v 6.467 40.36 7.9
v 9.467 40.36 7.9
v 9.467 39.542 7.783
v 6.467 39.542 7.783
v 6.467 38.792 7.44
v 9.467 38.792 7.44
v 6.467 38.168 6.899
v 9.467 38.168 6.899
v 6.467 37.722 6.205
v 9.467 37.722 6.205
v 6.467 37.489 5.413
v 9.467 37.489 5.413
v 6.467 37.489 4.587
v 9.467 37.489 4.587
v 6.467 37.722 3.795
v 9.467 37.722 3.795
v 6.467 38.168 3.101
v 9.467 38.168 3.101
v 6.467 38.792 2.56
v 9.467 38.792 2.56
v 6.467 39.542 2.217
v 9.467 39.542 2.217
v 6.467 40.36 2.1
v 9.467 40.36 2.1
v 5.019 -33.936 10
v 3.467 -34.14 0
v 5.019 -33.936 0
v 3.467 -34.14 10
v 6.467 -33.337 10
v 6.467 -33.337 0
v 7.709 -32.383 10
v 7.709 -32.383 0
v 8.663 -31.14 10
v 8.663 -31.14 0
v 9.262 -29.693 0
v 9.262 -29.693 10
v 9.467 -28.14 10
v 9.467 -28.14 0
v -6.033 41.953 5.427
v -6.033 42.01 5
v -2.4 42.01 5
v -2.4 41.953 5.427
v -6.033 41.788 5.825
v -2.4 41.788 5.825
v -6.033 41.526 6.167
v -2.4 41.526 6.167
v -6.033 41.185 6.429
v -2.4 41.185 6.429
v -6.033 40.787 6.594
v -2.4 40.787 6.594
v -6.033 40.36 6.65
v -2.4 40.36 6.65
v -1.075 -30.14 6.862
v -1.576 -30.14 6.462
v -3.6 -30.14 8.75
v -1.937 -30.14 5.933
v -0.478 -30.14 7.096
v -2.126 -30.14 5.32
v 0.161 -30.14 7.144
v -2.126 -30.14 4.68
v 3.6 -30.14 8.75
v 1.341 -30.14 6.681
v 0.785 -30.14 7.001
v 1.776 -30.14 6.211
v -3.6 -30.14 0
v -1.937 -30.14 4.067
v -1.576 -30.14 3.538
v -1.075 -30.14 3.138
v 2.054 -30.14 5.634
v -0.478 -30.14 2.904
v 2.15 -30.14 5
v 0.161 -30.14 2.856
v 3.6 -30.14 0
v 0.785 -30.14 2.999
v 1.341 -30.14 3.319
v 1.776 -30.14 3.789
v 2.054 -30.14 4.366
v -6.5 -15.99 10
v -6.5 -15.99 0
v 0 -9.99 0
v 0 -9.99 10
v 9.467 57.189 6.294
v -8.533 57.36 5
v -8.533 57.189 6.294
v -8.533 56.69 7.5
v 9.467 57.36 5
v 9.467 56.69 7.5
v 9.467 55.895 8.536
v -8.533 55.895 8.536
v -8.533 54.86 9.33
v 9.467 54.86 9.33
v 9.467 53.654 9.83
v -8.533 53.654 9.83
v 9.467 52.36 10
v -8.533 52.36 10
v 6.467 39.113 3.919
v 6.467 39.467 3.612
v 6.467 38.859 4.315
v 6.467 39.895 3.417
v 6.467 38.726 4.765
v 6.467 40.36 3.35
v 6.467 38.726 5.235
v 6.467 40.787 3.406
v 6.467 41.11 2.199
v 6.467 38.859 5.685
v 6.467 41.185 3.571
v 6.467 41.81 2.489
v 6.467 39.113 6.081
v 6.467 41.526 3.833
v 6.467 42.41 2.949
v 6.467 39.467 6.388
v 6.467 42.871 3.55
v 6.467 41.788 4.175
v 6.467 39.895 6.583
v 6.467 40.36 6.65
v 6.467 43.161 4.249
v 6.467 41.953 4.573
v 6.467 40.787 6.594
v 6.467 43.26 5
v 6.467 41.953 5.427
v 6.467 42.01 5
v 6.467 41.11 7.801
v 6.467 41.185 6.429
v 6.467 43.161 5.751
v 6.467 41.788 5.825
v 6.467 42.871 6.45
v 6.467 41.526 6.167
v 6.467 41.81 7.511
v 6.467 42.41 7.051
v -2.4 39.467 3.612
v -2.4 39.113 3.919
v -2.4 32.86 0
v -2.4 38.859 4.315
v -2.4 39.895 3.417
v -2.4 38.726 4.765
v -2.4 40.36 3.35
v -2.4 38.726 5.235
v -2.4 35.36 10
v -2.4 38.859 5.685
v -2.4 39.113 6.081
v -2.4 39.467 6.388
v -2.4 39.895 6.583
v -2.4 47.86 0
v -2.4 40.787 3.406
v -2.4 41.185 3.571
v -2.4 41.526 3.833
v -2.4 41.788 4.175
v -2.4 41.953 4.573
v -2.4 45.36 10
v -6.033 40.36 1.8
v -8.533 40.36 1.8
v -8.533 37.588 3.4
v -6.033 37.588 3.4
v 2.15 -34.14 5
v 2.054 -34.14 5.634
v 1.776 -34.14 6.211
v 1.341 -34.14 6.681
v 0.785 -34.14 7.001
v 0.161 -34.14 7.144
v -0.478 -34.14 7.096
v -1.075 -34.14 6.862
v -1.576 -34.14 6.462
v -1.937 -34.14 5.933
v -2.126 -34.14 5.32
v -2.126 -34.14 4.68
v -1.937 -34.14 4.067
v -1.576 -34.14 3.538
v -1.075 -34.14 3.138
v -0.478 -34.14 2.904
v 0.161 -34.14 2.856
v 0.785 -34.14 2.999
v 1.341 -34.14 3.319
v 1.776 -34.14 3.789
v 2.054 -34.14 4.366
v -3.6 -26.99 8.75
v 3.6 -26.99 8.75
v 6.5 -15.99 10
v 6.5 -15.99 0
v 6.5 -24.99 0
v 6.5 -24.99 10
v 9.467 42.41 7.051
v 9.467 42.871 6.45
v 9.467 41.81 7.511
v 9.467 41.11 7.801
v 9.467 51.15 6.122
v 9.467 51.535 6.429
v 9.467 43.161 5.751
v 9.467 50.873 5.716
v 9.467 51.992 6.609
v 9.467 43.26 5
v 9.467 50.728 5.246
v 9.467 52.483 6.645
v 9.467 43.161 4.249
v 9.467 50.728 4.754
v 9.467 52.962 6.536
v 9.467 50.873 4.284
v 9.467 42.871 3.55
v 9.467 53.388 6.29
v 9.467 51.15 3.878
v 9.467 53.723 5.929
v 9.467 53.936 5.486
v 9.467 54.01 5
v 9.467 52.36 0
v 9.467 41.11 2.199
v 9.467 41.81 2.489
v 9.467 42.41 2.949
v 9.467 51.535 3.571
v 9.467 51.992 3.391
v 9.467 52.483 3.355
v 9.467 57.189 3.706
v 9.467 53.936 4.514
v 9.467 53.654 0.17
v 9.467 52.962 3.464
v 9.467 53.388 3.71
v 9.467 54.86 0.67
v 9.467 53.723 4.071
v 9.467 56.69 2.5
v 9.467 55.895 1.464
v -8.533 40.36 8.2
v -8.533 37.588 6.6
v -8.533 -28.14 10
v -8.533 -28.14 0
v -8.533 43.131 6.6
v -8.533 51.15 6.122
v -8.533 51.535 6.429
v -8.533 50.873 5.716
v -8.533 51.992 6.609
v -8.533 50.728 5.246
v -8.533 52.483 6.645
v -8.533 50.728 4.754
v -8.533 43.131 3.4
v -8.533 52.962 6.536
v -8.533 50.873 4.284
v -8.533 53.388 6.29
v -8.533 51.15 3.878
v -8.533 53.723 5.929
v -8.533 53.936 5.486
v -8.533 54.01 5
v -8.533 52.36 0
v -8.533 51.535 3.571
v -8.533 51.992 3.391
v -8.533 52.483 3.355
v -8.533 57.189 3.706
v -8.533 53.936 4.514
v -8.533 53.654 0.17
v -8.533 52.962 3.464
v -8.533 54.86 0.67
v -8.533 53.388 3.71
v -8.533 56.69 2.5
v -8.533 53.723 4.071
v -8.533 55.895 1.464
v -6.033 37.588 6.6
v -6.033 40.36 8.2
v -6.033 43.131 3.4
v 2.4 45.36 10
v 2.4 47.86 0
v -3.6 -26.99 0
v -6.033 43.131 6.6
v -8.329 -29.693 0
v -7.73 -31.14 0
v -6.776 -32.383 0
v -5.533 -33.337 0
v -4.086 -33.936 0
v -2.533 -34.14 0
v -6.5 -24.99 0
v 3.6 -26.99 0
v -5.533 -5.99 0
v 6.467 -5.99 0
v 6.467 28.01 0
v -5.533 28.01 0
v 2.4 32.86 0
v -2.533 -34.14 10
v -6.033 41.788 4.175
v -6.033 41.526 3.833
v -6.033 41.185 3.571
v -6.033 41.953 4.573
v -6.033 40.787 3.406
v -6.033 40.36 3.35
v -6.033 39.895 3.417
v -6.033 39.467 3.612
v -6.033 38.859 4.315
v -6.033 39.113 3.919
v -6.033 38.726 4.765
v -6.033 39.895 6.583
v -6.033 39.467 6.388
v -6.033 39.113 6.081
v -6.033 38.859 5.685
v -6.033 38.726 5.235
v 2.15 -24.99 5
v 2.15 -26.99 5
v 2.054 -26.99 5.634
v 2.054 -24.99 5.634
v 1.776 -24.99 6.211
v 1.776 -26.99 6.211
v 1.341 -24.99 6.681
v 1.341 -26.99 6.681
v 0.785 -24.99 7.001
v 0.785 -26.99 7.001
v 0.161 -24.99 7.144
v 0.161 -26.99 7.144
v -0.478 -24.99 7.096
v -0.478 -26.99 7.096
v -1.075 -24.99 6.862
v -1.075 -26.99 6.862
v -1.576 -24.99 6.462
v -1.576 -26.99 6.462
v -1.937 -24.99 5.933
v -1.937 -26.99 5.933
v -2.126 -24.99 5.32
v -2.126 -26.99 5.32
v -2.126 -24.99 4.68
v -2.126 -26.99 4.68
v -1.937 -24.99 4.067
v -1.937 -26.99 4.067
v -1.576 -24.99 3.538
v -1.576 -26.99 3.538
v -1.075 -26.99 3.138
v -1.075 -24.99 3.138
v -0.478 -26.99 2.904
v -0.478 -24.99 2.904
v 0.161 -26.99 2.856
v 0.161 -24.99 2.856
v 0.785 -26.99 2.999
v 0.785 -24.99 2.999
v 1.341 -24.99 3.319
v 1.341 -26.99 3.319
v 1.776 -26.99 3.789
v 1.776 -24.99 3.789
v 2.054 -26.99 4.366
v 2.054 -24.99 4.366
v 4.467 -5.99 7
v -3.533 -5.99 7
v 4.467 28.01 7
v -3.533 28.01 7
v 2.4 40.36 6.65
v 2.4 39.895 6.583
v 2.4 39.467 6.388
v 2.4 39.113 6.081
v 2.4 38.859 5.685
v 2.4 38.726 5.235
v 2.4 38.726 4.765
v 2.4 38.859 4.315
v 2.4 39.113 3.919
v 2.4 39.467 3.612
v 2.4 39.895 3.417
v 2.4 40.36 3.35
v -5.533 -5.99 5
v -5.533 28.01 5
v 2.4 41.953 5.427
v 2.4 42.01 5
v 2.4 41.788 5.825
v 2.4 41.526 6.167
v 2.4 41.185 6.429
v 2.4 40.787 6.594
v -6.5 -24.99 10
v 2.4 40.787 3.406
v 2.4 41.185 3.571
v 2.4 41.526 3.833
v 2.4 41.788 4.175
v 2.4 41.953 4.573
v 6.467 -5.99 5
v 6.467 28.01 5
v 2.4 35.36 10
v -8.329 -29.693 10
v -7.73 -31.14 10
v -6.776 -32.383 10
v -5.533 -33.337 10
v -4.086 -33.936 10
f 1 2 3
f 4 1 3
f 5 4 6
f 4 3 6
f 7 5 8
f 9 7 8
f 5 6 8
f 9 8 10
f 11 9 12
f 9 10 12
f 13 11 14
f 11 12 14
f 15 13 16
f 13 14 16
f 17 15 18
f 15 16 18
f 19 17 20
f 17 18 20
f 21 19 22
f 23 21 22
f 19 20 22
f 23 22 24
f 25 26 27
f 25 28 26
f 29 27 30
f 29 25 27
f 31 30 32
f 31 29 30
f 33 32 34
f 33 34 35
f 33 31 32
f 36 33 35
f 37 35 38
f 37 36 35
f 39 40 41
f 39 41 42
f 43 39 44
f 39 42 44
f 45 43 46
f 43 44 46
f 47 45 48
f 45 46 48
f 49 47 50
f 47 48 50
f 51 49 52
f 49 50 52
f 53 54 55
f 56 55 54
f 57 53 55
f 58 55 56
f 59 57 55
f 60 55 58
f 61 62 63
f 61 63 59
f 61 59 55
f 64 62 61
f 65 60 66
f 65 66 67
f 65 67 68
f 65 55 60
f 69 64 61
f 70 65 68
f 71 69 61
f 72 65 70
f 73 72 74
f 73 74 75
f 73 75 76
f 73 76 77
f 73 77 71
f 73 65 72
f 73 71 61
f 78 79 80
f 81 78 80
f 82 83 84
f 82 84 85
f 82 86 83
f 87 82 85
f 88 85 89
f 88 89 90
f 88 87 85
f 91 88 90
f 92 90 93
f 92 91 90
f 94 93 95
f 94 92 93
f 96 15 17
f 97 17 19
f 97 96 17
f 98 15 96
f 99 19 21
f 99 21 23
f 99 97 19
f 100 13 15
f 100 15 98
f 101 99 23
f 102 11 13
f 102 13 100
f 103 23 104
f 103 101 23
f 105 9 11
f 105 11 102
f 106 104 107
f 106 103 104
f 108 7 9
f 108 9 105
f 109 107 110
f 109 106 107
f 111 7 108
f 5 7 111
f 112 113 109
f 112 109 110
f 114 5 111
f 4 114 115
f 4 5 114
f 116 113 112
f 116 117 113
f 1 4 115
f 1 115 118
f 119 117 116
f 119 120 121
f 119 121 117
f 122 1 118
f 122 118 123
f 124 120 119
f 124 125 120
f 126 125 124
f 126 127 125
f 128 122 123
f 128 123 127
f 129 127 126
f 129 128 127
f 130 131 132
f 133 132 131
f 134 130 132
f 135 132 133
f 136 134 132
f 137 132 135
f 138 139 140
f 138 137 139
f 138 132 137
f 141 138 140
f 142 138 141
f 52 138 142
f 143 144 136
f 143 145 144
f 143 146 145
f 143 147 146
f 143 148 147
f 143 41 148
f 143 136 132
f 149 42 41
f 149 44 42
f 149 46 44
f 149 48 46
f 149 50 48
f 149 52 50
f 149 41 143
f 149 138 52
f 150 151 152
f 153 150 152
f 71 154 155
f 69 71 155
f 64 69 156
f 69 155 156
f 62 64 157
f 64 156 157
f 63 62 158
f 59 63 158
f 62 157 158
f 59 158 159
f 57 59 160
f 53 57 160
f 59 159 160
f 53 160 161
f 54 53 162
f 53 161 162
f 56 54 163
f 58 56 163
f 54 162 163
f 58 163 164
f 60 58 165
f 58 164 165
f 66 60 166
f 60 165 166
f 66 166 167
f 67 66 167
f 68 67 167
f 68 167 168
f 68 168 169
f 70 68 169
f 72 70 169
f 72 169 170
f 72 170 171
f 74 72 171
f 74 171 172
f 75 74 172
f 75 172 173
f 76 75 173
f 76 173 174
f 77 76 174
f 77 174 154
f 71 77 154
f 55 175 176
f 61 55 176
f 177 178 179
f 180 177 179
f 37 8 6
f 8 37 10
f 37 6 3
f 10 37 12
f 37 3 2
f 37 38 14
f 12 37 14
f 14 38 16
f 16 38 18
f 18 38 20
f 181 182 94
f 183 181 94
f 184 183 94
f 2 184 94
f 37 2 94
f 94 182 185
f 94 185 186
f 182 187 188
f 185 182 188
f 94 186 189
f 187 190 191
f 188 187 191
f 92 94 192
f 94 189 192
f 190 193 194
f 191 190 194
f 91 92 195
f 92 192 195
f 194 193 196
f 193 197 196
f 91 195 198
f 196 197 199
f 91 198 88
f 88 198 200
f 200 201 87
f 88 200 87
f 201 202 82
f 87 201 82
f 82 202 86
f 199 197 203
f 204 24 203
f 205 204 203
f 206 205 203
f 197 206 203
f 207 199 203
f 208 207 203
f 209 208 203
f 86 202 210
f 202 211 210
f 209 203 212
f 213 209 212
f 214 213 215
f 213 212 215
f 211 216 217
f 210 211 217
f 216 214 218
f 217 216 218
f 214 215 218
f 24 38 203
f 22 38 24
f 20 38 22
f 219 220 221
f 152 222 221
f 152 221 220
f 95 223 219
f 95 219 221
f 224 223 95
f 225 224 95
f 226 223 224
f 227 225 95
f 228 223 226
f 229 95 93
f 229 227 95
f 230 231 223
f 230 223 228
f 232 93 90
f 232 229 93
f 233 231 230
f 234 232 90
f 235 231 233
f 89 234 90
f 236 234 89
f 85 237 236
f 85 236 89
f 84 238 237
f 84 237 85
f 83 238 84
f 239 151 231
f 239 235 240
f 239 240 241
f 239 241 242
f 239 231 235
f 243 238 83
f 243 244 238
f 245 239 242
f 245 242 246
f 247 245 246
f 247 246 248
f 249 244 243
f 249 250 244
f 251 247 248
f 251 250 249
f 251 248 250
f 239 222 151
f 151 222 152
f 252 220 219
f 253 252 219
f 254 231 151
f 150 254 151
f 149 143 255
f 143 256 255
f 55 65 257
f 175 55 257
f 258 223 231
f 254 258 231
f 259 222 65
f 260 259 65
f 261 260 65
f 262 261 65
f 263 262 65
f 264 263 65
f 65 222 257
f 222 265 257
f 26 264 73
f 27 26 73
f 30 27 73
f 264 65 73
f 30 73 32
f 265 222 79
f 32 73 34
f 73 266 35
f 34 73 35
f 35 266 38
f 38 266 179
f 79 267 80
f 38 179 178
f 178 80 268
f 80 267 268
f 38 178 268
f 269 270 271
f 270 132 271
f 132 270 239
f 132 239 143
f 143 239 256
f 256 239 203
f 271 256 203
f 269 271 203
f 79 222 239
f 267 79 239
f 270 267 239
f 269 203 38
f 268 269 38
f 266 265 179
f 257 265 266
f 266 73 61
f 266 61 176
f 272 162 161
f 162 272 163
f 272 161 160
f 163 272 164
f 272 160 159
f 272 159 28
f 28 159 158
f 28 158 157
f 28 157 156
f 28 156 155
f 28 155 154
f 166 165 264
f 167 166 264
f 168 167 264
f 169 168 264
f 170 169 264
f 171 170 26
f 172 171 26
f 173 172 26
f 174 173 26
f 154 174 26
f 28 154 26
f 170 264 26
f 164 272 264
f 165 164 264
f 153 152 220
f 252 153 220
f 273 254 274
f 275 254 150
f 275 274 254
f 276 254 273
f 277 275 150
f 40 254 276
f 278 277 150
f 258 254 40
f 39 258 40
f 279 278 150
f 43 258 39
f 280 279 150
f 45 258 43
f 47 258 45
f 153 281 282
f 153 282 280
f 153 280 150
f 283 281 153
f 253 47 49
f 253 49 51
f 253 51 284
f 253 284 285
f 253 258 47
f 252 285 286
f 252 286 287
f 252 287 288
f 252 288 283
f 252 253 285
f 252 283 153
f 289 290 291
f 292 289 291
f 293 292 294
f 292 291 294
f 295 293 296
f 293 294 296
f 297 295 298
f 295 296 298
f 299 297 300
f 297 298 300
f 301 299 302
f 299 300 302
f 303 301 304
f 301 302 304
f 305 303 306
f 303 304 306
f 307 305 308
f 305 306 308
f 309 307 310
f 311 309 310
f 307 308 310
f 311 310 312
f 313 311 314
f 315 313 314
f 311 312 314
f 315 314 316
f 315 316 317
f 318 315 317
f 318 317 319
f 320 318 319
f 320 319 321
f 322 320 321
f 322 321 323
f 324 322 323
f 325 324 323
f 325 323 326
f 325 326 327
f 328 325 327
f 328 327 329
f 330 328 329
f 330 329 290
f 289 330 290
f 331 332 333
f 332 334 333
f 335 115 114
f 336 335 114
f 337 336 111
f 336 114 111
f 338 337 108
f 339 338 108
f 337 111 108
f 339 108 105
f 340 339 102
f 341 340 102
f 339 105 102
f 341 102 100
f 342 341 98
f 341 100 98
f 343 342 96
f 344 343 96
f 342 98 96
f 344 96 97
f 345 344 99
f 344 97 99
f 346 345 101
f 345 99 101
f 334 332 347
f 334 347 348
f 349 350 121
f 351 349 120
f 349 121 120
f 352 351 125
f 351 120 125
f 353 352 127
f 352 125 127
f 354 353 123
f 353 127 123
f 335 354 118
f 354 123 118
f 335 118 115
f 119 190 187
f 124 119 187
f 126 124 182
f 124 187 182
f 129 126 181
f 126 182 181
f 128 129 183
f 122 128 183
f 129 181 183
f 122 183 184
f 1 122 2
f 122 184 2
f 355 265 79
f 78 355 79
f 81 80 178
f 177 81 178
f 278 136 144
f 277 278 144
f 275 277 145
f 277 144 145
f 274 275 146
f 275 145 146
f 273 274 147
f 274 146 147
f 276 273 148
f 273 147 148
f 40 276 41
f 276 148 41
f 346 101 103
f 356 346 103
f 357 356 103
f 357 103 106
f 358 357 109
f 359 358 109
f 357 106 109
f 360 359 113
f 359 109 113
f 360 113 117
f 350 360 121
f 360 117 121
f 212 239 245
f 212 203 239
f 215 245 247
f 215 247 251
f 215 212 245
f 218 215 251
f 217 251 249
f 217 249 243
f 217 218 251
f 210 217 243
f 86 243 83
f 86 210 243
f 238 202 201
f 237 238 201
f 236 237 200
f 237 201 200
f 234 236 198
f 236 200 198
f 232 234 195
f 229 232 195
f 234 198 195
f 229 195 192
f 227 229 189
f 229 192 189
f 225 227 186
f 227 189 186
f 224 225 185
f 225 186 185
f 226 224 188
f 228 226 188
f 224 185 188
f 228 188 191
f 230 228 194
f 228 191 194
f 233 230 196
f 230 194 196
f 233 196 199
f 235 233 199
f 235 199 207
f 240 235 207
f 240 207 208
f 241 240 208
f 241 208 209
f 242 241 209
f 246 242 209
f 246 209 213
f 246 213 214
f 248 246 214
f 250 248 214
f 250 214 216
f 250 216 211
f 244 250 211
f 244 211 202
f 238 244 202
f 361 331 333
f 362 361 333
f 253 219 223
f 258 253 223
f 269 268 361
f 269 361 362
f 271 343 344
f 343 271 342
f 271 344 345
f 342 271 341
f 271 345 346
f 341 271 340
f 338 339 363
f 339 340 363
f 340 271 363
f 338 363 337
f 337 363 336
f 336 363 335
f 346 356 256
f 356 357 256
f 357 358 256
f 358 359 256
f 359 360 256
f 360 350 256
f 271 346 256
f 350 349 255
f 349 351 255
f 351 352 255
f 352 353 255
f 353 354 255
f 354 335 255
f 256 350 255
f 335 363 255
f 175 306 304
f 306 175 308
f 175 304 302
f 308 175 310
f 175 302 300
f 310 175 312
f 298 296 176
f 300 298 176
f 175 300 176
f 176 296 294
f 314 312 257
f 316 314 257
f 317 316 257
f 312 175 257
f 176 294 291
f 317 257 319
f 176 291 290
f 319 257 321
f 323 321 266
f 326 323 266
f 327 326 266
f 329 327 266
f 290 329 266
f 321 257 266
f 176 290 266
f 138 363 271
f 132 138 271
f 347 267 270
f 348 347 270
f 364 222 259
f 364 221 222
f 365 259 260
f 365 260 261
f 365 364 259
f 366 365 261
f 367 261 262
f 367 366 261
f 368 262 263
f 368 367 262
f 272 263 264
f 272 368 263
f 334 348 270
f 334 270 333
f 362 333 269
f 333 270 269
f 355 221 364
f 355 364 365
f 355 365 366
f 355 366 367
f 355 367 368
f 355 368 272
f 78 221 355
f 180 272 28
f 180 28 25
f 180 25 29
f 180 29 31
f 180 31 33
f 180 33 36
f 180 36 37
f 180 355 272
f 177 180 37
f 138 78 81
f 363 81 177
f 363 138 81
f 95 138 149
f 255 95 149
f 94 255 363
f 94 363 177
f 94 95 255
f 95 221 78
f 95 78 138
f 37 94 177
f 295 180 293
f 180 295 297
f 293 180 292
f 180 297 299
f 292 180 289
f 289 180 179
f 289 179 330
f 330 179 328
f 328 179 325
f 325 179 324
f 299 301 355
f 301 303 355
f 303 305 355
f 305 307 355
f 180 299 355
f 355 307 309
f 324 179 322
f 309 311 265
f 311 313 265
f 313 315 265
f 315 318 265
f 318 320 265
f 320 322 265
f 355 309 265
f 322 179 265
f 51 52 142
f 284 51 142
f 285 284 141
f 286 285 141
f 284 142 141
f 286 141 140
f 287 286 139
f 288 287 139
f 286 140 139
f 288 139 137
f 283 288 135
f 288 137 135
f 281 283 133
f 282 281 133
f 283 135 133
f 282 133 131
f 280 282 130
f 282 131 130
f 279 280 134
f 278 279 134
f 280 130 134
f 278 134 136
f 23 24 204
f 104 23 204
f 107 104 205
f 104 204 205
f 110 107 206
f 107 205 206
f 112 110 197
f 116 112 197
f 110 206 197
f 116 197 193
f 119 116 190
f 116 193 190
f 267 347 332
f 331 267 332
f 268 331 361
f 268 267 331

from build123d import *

# Parameters (mm, degrees)
F0_W      = 18
F0_H      = 91.5
F0_W_2    = 7.2
F0_H_2    = 3.15
F0_W_3    = 12
F0_H_3    = 34
F1_DEPTH  = 10
F2_R      = 6
F4_DEPTH  = 7
F5_SIZE   = 2
F6_R      = 1.65
F7_DEPTH  = 25
F8_DEPTH  = 3
F10_R     = 4.99999
F12_DEPTH = 2.4
F15_DEPTH = 2.5
F17_R     = 2.15
F18_DEPTH = 20
F20_W     = 7.2
F20_H     = 3.15
F21_DEPTH = 1.25


# Not quite as in the source:
# - a fillet or chamfer is up to 0.001 mm smaller than in the source, because OpenCascade refuses the exact size


with BuildPart() as f1:
    # F0 (on Top) → F1 (new body)
    with BuildSketch(Plane.XY):
        with Locations((0.4665288143, 11.6095117688)):
            Rectangle(F0_W, F0_H)
        with Locations((0, -28.5654882312)):
            Rectangle(F0_W_2, F0_H_2, mode=Mode.SUBTRACT)
        Polygon((6.5, -24.9904882312), (-6.5, -24.9904882312), (-6.5, -15.9904882312), (0, -9.9904882312), (6.5, -15.9904882312), align=None, mode=Mode.SUBTRACT)
        with Locations((0.4665288143, 11.0095117688)):
            Rectangle(F0_W_3, F0_H_3, mode=Mode.SUBTRACT)
        with Locations((0.4665288143, 11.0095117688)):
            Rectangle(F0_W_3, F0_H_3)
    extrude(amount=F1_DEPTH)

    # F2
    f2_edges = [f1.edges().sort_by_distance(p)[0] for p in [
        (9.466529, -34.140488, 5),
        (-8.533471, -34.140488, 5),
    ]]
    fillet(f2_edges, radius=F2_R)

    # F0 (on Top) → F4 (cut)
    with BuildSketch(Plane.XY):
        with Locations((0.4665288143, 11.0095117688)):
            Rectangle(F0_W_3, F0_H_3)
    extrude(amount=F4_DEPTH, mode=Mode.SUBTRACT)

    # F5
    f5_edges = [f1.edges().sort_by_distance(p)[0] for p in [
        (6.466529, 11.009512, 7),
        (-5.533471, 11.009512, 7),
    ]]
    chamfer(f5_edges, length=F5_SIZE)

    # F6 (on offset) → F7 (cut)
    with BuildSketch(Plane.YZ.offset(9.4665288143)):
        with BuildLine():
            Line((40.3595117688, 3.35), (40.3595117688, 6.65))
            ThreePointArc((40.3595117688, 6.65), (38.7095117688, 5), (40.3595117688, 3.35))
        make_face()
        with BuildLine():
            ThreePointArc((42.0095117688, 5), (41.5262379578, 6.166726189), (40.3595117688, 6.65))
            Line((40.3595117688, 6.65), (40.3595117688, 3.35))
            ThreePointArc((40.3595117688, 3.35), (41.5262379578, 3.833273811), (42.0095117688, 5))
        make_face()
        with Locations((52.3595117688, 5)):
            Circle(F6_R)
    extrude(amount=-F7_DEPTH, mode=Mode.SUBTRACT)

    # F6 (on offset) → F8 (cut)
    with BuildSketch(Plane.YZ.offset(9.4665288143)):
        with BuildLine():
            Line((40.3595117688, 6.65), (40.3595117688, 7.9))
            ThreePointArc((40.3595117688, 7.9), (37.4595117688, 5), (40.3595117688, 2.1))
            Line((40.3595117688, 2.1), (40.3595117688, 3.35))
            ThreePointArc((40.3595117688, 3.35), (38.7095117688, 5), (40.3595117688, 6.65))
        make_face()
        with BuildLine():
            ThreePointArc((43.2595117688, 5), (42.4101214343, 7.0506096654), (40.3595117688, 7.9))
            Line((40.3595117688, 7.9), (40.3595117688, 6.65))
            ThreePointArc((40.3595117688, 6.65), (41.5262379578, 6.166726189), (42.0095117688, 5))
            ThreePointArc((42.0095117688, 5), (41.5262379578, 3.833273811), (40.3595117688, 3.35))
            Line((40.3595117688, 3.35), (40.3595117688, 2.1))
            ThreePointArc((40.3595117688, 2.1), (42.4101214343, 2.9493903346), (43.2595117688, 5))
        make_face()
    extrude(amount=-F8_DEPTH, mode=Mode.SUBTRACT)

    # F10 (radius 5 in the source; OpenCascade refuses exactly that, so slightly less here)
    f10_edges = [f1.edges().sort_by_distance(p)[0] for p in [
        (0.466529, 57.359512, 0),
        (0.466529, 57.359512, 10),
    ]]
    fillet(f10_edges, radius=F10_R)

    # F11 (on offset) → F12 (cut, symmetric)
    with BuildSketch(Plane.YZ):
        Polygon((47.8595117688, 0), (45.3595117688, 10), (35.3595117688, 10), (32.8595117688, 0), align=None)
    extrude(amount=F12_DEPTH, both=True, mode=Mode.SUBTRACT)

    # F14 (on offset) → F15 (cut)
    with BuildSketch(Plane(origin=(-8.5334711857, 0, 0), x_dir=(0, -1, 0), z_dir=(-1, 0, 0))):
        Polygon((-37.5882304767, 3.4), (-37.5882304767, 6.6), (-40.3595117688, 8.2), (-43.1307930609, 6.6), (-43.1307930609, 3.4), (-40.3595117688, 1.8), align=None)
    extrude(amount=-F15_DEPTH, mode=Mode.SUBTRACT)

    # F17 (on offset) → F18 (cut)
    with BuildSketch(Plane.XZ.offset(34.1404882312)):
        with Locations((0, 5)):
            Circle(F17_R)
    extrude(amount=-F18_DEPTH, mode=Mode.SUBTRACT)

    # F20 (on offset) → F21 (join)
    with BuildSketch(Plane.XY.offset(10)):
        with Locations((0, -28.5654882312)):
            Rectangle(F20_W, F20_H)
    extrude(amount=-F21_DEPTH)


solid = f1.part
